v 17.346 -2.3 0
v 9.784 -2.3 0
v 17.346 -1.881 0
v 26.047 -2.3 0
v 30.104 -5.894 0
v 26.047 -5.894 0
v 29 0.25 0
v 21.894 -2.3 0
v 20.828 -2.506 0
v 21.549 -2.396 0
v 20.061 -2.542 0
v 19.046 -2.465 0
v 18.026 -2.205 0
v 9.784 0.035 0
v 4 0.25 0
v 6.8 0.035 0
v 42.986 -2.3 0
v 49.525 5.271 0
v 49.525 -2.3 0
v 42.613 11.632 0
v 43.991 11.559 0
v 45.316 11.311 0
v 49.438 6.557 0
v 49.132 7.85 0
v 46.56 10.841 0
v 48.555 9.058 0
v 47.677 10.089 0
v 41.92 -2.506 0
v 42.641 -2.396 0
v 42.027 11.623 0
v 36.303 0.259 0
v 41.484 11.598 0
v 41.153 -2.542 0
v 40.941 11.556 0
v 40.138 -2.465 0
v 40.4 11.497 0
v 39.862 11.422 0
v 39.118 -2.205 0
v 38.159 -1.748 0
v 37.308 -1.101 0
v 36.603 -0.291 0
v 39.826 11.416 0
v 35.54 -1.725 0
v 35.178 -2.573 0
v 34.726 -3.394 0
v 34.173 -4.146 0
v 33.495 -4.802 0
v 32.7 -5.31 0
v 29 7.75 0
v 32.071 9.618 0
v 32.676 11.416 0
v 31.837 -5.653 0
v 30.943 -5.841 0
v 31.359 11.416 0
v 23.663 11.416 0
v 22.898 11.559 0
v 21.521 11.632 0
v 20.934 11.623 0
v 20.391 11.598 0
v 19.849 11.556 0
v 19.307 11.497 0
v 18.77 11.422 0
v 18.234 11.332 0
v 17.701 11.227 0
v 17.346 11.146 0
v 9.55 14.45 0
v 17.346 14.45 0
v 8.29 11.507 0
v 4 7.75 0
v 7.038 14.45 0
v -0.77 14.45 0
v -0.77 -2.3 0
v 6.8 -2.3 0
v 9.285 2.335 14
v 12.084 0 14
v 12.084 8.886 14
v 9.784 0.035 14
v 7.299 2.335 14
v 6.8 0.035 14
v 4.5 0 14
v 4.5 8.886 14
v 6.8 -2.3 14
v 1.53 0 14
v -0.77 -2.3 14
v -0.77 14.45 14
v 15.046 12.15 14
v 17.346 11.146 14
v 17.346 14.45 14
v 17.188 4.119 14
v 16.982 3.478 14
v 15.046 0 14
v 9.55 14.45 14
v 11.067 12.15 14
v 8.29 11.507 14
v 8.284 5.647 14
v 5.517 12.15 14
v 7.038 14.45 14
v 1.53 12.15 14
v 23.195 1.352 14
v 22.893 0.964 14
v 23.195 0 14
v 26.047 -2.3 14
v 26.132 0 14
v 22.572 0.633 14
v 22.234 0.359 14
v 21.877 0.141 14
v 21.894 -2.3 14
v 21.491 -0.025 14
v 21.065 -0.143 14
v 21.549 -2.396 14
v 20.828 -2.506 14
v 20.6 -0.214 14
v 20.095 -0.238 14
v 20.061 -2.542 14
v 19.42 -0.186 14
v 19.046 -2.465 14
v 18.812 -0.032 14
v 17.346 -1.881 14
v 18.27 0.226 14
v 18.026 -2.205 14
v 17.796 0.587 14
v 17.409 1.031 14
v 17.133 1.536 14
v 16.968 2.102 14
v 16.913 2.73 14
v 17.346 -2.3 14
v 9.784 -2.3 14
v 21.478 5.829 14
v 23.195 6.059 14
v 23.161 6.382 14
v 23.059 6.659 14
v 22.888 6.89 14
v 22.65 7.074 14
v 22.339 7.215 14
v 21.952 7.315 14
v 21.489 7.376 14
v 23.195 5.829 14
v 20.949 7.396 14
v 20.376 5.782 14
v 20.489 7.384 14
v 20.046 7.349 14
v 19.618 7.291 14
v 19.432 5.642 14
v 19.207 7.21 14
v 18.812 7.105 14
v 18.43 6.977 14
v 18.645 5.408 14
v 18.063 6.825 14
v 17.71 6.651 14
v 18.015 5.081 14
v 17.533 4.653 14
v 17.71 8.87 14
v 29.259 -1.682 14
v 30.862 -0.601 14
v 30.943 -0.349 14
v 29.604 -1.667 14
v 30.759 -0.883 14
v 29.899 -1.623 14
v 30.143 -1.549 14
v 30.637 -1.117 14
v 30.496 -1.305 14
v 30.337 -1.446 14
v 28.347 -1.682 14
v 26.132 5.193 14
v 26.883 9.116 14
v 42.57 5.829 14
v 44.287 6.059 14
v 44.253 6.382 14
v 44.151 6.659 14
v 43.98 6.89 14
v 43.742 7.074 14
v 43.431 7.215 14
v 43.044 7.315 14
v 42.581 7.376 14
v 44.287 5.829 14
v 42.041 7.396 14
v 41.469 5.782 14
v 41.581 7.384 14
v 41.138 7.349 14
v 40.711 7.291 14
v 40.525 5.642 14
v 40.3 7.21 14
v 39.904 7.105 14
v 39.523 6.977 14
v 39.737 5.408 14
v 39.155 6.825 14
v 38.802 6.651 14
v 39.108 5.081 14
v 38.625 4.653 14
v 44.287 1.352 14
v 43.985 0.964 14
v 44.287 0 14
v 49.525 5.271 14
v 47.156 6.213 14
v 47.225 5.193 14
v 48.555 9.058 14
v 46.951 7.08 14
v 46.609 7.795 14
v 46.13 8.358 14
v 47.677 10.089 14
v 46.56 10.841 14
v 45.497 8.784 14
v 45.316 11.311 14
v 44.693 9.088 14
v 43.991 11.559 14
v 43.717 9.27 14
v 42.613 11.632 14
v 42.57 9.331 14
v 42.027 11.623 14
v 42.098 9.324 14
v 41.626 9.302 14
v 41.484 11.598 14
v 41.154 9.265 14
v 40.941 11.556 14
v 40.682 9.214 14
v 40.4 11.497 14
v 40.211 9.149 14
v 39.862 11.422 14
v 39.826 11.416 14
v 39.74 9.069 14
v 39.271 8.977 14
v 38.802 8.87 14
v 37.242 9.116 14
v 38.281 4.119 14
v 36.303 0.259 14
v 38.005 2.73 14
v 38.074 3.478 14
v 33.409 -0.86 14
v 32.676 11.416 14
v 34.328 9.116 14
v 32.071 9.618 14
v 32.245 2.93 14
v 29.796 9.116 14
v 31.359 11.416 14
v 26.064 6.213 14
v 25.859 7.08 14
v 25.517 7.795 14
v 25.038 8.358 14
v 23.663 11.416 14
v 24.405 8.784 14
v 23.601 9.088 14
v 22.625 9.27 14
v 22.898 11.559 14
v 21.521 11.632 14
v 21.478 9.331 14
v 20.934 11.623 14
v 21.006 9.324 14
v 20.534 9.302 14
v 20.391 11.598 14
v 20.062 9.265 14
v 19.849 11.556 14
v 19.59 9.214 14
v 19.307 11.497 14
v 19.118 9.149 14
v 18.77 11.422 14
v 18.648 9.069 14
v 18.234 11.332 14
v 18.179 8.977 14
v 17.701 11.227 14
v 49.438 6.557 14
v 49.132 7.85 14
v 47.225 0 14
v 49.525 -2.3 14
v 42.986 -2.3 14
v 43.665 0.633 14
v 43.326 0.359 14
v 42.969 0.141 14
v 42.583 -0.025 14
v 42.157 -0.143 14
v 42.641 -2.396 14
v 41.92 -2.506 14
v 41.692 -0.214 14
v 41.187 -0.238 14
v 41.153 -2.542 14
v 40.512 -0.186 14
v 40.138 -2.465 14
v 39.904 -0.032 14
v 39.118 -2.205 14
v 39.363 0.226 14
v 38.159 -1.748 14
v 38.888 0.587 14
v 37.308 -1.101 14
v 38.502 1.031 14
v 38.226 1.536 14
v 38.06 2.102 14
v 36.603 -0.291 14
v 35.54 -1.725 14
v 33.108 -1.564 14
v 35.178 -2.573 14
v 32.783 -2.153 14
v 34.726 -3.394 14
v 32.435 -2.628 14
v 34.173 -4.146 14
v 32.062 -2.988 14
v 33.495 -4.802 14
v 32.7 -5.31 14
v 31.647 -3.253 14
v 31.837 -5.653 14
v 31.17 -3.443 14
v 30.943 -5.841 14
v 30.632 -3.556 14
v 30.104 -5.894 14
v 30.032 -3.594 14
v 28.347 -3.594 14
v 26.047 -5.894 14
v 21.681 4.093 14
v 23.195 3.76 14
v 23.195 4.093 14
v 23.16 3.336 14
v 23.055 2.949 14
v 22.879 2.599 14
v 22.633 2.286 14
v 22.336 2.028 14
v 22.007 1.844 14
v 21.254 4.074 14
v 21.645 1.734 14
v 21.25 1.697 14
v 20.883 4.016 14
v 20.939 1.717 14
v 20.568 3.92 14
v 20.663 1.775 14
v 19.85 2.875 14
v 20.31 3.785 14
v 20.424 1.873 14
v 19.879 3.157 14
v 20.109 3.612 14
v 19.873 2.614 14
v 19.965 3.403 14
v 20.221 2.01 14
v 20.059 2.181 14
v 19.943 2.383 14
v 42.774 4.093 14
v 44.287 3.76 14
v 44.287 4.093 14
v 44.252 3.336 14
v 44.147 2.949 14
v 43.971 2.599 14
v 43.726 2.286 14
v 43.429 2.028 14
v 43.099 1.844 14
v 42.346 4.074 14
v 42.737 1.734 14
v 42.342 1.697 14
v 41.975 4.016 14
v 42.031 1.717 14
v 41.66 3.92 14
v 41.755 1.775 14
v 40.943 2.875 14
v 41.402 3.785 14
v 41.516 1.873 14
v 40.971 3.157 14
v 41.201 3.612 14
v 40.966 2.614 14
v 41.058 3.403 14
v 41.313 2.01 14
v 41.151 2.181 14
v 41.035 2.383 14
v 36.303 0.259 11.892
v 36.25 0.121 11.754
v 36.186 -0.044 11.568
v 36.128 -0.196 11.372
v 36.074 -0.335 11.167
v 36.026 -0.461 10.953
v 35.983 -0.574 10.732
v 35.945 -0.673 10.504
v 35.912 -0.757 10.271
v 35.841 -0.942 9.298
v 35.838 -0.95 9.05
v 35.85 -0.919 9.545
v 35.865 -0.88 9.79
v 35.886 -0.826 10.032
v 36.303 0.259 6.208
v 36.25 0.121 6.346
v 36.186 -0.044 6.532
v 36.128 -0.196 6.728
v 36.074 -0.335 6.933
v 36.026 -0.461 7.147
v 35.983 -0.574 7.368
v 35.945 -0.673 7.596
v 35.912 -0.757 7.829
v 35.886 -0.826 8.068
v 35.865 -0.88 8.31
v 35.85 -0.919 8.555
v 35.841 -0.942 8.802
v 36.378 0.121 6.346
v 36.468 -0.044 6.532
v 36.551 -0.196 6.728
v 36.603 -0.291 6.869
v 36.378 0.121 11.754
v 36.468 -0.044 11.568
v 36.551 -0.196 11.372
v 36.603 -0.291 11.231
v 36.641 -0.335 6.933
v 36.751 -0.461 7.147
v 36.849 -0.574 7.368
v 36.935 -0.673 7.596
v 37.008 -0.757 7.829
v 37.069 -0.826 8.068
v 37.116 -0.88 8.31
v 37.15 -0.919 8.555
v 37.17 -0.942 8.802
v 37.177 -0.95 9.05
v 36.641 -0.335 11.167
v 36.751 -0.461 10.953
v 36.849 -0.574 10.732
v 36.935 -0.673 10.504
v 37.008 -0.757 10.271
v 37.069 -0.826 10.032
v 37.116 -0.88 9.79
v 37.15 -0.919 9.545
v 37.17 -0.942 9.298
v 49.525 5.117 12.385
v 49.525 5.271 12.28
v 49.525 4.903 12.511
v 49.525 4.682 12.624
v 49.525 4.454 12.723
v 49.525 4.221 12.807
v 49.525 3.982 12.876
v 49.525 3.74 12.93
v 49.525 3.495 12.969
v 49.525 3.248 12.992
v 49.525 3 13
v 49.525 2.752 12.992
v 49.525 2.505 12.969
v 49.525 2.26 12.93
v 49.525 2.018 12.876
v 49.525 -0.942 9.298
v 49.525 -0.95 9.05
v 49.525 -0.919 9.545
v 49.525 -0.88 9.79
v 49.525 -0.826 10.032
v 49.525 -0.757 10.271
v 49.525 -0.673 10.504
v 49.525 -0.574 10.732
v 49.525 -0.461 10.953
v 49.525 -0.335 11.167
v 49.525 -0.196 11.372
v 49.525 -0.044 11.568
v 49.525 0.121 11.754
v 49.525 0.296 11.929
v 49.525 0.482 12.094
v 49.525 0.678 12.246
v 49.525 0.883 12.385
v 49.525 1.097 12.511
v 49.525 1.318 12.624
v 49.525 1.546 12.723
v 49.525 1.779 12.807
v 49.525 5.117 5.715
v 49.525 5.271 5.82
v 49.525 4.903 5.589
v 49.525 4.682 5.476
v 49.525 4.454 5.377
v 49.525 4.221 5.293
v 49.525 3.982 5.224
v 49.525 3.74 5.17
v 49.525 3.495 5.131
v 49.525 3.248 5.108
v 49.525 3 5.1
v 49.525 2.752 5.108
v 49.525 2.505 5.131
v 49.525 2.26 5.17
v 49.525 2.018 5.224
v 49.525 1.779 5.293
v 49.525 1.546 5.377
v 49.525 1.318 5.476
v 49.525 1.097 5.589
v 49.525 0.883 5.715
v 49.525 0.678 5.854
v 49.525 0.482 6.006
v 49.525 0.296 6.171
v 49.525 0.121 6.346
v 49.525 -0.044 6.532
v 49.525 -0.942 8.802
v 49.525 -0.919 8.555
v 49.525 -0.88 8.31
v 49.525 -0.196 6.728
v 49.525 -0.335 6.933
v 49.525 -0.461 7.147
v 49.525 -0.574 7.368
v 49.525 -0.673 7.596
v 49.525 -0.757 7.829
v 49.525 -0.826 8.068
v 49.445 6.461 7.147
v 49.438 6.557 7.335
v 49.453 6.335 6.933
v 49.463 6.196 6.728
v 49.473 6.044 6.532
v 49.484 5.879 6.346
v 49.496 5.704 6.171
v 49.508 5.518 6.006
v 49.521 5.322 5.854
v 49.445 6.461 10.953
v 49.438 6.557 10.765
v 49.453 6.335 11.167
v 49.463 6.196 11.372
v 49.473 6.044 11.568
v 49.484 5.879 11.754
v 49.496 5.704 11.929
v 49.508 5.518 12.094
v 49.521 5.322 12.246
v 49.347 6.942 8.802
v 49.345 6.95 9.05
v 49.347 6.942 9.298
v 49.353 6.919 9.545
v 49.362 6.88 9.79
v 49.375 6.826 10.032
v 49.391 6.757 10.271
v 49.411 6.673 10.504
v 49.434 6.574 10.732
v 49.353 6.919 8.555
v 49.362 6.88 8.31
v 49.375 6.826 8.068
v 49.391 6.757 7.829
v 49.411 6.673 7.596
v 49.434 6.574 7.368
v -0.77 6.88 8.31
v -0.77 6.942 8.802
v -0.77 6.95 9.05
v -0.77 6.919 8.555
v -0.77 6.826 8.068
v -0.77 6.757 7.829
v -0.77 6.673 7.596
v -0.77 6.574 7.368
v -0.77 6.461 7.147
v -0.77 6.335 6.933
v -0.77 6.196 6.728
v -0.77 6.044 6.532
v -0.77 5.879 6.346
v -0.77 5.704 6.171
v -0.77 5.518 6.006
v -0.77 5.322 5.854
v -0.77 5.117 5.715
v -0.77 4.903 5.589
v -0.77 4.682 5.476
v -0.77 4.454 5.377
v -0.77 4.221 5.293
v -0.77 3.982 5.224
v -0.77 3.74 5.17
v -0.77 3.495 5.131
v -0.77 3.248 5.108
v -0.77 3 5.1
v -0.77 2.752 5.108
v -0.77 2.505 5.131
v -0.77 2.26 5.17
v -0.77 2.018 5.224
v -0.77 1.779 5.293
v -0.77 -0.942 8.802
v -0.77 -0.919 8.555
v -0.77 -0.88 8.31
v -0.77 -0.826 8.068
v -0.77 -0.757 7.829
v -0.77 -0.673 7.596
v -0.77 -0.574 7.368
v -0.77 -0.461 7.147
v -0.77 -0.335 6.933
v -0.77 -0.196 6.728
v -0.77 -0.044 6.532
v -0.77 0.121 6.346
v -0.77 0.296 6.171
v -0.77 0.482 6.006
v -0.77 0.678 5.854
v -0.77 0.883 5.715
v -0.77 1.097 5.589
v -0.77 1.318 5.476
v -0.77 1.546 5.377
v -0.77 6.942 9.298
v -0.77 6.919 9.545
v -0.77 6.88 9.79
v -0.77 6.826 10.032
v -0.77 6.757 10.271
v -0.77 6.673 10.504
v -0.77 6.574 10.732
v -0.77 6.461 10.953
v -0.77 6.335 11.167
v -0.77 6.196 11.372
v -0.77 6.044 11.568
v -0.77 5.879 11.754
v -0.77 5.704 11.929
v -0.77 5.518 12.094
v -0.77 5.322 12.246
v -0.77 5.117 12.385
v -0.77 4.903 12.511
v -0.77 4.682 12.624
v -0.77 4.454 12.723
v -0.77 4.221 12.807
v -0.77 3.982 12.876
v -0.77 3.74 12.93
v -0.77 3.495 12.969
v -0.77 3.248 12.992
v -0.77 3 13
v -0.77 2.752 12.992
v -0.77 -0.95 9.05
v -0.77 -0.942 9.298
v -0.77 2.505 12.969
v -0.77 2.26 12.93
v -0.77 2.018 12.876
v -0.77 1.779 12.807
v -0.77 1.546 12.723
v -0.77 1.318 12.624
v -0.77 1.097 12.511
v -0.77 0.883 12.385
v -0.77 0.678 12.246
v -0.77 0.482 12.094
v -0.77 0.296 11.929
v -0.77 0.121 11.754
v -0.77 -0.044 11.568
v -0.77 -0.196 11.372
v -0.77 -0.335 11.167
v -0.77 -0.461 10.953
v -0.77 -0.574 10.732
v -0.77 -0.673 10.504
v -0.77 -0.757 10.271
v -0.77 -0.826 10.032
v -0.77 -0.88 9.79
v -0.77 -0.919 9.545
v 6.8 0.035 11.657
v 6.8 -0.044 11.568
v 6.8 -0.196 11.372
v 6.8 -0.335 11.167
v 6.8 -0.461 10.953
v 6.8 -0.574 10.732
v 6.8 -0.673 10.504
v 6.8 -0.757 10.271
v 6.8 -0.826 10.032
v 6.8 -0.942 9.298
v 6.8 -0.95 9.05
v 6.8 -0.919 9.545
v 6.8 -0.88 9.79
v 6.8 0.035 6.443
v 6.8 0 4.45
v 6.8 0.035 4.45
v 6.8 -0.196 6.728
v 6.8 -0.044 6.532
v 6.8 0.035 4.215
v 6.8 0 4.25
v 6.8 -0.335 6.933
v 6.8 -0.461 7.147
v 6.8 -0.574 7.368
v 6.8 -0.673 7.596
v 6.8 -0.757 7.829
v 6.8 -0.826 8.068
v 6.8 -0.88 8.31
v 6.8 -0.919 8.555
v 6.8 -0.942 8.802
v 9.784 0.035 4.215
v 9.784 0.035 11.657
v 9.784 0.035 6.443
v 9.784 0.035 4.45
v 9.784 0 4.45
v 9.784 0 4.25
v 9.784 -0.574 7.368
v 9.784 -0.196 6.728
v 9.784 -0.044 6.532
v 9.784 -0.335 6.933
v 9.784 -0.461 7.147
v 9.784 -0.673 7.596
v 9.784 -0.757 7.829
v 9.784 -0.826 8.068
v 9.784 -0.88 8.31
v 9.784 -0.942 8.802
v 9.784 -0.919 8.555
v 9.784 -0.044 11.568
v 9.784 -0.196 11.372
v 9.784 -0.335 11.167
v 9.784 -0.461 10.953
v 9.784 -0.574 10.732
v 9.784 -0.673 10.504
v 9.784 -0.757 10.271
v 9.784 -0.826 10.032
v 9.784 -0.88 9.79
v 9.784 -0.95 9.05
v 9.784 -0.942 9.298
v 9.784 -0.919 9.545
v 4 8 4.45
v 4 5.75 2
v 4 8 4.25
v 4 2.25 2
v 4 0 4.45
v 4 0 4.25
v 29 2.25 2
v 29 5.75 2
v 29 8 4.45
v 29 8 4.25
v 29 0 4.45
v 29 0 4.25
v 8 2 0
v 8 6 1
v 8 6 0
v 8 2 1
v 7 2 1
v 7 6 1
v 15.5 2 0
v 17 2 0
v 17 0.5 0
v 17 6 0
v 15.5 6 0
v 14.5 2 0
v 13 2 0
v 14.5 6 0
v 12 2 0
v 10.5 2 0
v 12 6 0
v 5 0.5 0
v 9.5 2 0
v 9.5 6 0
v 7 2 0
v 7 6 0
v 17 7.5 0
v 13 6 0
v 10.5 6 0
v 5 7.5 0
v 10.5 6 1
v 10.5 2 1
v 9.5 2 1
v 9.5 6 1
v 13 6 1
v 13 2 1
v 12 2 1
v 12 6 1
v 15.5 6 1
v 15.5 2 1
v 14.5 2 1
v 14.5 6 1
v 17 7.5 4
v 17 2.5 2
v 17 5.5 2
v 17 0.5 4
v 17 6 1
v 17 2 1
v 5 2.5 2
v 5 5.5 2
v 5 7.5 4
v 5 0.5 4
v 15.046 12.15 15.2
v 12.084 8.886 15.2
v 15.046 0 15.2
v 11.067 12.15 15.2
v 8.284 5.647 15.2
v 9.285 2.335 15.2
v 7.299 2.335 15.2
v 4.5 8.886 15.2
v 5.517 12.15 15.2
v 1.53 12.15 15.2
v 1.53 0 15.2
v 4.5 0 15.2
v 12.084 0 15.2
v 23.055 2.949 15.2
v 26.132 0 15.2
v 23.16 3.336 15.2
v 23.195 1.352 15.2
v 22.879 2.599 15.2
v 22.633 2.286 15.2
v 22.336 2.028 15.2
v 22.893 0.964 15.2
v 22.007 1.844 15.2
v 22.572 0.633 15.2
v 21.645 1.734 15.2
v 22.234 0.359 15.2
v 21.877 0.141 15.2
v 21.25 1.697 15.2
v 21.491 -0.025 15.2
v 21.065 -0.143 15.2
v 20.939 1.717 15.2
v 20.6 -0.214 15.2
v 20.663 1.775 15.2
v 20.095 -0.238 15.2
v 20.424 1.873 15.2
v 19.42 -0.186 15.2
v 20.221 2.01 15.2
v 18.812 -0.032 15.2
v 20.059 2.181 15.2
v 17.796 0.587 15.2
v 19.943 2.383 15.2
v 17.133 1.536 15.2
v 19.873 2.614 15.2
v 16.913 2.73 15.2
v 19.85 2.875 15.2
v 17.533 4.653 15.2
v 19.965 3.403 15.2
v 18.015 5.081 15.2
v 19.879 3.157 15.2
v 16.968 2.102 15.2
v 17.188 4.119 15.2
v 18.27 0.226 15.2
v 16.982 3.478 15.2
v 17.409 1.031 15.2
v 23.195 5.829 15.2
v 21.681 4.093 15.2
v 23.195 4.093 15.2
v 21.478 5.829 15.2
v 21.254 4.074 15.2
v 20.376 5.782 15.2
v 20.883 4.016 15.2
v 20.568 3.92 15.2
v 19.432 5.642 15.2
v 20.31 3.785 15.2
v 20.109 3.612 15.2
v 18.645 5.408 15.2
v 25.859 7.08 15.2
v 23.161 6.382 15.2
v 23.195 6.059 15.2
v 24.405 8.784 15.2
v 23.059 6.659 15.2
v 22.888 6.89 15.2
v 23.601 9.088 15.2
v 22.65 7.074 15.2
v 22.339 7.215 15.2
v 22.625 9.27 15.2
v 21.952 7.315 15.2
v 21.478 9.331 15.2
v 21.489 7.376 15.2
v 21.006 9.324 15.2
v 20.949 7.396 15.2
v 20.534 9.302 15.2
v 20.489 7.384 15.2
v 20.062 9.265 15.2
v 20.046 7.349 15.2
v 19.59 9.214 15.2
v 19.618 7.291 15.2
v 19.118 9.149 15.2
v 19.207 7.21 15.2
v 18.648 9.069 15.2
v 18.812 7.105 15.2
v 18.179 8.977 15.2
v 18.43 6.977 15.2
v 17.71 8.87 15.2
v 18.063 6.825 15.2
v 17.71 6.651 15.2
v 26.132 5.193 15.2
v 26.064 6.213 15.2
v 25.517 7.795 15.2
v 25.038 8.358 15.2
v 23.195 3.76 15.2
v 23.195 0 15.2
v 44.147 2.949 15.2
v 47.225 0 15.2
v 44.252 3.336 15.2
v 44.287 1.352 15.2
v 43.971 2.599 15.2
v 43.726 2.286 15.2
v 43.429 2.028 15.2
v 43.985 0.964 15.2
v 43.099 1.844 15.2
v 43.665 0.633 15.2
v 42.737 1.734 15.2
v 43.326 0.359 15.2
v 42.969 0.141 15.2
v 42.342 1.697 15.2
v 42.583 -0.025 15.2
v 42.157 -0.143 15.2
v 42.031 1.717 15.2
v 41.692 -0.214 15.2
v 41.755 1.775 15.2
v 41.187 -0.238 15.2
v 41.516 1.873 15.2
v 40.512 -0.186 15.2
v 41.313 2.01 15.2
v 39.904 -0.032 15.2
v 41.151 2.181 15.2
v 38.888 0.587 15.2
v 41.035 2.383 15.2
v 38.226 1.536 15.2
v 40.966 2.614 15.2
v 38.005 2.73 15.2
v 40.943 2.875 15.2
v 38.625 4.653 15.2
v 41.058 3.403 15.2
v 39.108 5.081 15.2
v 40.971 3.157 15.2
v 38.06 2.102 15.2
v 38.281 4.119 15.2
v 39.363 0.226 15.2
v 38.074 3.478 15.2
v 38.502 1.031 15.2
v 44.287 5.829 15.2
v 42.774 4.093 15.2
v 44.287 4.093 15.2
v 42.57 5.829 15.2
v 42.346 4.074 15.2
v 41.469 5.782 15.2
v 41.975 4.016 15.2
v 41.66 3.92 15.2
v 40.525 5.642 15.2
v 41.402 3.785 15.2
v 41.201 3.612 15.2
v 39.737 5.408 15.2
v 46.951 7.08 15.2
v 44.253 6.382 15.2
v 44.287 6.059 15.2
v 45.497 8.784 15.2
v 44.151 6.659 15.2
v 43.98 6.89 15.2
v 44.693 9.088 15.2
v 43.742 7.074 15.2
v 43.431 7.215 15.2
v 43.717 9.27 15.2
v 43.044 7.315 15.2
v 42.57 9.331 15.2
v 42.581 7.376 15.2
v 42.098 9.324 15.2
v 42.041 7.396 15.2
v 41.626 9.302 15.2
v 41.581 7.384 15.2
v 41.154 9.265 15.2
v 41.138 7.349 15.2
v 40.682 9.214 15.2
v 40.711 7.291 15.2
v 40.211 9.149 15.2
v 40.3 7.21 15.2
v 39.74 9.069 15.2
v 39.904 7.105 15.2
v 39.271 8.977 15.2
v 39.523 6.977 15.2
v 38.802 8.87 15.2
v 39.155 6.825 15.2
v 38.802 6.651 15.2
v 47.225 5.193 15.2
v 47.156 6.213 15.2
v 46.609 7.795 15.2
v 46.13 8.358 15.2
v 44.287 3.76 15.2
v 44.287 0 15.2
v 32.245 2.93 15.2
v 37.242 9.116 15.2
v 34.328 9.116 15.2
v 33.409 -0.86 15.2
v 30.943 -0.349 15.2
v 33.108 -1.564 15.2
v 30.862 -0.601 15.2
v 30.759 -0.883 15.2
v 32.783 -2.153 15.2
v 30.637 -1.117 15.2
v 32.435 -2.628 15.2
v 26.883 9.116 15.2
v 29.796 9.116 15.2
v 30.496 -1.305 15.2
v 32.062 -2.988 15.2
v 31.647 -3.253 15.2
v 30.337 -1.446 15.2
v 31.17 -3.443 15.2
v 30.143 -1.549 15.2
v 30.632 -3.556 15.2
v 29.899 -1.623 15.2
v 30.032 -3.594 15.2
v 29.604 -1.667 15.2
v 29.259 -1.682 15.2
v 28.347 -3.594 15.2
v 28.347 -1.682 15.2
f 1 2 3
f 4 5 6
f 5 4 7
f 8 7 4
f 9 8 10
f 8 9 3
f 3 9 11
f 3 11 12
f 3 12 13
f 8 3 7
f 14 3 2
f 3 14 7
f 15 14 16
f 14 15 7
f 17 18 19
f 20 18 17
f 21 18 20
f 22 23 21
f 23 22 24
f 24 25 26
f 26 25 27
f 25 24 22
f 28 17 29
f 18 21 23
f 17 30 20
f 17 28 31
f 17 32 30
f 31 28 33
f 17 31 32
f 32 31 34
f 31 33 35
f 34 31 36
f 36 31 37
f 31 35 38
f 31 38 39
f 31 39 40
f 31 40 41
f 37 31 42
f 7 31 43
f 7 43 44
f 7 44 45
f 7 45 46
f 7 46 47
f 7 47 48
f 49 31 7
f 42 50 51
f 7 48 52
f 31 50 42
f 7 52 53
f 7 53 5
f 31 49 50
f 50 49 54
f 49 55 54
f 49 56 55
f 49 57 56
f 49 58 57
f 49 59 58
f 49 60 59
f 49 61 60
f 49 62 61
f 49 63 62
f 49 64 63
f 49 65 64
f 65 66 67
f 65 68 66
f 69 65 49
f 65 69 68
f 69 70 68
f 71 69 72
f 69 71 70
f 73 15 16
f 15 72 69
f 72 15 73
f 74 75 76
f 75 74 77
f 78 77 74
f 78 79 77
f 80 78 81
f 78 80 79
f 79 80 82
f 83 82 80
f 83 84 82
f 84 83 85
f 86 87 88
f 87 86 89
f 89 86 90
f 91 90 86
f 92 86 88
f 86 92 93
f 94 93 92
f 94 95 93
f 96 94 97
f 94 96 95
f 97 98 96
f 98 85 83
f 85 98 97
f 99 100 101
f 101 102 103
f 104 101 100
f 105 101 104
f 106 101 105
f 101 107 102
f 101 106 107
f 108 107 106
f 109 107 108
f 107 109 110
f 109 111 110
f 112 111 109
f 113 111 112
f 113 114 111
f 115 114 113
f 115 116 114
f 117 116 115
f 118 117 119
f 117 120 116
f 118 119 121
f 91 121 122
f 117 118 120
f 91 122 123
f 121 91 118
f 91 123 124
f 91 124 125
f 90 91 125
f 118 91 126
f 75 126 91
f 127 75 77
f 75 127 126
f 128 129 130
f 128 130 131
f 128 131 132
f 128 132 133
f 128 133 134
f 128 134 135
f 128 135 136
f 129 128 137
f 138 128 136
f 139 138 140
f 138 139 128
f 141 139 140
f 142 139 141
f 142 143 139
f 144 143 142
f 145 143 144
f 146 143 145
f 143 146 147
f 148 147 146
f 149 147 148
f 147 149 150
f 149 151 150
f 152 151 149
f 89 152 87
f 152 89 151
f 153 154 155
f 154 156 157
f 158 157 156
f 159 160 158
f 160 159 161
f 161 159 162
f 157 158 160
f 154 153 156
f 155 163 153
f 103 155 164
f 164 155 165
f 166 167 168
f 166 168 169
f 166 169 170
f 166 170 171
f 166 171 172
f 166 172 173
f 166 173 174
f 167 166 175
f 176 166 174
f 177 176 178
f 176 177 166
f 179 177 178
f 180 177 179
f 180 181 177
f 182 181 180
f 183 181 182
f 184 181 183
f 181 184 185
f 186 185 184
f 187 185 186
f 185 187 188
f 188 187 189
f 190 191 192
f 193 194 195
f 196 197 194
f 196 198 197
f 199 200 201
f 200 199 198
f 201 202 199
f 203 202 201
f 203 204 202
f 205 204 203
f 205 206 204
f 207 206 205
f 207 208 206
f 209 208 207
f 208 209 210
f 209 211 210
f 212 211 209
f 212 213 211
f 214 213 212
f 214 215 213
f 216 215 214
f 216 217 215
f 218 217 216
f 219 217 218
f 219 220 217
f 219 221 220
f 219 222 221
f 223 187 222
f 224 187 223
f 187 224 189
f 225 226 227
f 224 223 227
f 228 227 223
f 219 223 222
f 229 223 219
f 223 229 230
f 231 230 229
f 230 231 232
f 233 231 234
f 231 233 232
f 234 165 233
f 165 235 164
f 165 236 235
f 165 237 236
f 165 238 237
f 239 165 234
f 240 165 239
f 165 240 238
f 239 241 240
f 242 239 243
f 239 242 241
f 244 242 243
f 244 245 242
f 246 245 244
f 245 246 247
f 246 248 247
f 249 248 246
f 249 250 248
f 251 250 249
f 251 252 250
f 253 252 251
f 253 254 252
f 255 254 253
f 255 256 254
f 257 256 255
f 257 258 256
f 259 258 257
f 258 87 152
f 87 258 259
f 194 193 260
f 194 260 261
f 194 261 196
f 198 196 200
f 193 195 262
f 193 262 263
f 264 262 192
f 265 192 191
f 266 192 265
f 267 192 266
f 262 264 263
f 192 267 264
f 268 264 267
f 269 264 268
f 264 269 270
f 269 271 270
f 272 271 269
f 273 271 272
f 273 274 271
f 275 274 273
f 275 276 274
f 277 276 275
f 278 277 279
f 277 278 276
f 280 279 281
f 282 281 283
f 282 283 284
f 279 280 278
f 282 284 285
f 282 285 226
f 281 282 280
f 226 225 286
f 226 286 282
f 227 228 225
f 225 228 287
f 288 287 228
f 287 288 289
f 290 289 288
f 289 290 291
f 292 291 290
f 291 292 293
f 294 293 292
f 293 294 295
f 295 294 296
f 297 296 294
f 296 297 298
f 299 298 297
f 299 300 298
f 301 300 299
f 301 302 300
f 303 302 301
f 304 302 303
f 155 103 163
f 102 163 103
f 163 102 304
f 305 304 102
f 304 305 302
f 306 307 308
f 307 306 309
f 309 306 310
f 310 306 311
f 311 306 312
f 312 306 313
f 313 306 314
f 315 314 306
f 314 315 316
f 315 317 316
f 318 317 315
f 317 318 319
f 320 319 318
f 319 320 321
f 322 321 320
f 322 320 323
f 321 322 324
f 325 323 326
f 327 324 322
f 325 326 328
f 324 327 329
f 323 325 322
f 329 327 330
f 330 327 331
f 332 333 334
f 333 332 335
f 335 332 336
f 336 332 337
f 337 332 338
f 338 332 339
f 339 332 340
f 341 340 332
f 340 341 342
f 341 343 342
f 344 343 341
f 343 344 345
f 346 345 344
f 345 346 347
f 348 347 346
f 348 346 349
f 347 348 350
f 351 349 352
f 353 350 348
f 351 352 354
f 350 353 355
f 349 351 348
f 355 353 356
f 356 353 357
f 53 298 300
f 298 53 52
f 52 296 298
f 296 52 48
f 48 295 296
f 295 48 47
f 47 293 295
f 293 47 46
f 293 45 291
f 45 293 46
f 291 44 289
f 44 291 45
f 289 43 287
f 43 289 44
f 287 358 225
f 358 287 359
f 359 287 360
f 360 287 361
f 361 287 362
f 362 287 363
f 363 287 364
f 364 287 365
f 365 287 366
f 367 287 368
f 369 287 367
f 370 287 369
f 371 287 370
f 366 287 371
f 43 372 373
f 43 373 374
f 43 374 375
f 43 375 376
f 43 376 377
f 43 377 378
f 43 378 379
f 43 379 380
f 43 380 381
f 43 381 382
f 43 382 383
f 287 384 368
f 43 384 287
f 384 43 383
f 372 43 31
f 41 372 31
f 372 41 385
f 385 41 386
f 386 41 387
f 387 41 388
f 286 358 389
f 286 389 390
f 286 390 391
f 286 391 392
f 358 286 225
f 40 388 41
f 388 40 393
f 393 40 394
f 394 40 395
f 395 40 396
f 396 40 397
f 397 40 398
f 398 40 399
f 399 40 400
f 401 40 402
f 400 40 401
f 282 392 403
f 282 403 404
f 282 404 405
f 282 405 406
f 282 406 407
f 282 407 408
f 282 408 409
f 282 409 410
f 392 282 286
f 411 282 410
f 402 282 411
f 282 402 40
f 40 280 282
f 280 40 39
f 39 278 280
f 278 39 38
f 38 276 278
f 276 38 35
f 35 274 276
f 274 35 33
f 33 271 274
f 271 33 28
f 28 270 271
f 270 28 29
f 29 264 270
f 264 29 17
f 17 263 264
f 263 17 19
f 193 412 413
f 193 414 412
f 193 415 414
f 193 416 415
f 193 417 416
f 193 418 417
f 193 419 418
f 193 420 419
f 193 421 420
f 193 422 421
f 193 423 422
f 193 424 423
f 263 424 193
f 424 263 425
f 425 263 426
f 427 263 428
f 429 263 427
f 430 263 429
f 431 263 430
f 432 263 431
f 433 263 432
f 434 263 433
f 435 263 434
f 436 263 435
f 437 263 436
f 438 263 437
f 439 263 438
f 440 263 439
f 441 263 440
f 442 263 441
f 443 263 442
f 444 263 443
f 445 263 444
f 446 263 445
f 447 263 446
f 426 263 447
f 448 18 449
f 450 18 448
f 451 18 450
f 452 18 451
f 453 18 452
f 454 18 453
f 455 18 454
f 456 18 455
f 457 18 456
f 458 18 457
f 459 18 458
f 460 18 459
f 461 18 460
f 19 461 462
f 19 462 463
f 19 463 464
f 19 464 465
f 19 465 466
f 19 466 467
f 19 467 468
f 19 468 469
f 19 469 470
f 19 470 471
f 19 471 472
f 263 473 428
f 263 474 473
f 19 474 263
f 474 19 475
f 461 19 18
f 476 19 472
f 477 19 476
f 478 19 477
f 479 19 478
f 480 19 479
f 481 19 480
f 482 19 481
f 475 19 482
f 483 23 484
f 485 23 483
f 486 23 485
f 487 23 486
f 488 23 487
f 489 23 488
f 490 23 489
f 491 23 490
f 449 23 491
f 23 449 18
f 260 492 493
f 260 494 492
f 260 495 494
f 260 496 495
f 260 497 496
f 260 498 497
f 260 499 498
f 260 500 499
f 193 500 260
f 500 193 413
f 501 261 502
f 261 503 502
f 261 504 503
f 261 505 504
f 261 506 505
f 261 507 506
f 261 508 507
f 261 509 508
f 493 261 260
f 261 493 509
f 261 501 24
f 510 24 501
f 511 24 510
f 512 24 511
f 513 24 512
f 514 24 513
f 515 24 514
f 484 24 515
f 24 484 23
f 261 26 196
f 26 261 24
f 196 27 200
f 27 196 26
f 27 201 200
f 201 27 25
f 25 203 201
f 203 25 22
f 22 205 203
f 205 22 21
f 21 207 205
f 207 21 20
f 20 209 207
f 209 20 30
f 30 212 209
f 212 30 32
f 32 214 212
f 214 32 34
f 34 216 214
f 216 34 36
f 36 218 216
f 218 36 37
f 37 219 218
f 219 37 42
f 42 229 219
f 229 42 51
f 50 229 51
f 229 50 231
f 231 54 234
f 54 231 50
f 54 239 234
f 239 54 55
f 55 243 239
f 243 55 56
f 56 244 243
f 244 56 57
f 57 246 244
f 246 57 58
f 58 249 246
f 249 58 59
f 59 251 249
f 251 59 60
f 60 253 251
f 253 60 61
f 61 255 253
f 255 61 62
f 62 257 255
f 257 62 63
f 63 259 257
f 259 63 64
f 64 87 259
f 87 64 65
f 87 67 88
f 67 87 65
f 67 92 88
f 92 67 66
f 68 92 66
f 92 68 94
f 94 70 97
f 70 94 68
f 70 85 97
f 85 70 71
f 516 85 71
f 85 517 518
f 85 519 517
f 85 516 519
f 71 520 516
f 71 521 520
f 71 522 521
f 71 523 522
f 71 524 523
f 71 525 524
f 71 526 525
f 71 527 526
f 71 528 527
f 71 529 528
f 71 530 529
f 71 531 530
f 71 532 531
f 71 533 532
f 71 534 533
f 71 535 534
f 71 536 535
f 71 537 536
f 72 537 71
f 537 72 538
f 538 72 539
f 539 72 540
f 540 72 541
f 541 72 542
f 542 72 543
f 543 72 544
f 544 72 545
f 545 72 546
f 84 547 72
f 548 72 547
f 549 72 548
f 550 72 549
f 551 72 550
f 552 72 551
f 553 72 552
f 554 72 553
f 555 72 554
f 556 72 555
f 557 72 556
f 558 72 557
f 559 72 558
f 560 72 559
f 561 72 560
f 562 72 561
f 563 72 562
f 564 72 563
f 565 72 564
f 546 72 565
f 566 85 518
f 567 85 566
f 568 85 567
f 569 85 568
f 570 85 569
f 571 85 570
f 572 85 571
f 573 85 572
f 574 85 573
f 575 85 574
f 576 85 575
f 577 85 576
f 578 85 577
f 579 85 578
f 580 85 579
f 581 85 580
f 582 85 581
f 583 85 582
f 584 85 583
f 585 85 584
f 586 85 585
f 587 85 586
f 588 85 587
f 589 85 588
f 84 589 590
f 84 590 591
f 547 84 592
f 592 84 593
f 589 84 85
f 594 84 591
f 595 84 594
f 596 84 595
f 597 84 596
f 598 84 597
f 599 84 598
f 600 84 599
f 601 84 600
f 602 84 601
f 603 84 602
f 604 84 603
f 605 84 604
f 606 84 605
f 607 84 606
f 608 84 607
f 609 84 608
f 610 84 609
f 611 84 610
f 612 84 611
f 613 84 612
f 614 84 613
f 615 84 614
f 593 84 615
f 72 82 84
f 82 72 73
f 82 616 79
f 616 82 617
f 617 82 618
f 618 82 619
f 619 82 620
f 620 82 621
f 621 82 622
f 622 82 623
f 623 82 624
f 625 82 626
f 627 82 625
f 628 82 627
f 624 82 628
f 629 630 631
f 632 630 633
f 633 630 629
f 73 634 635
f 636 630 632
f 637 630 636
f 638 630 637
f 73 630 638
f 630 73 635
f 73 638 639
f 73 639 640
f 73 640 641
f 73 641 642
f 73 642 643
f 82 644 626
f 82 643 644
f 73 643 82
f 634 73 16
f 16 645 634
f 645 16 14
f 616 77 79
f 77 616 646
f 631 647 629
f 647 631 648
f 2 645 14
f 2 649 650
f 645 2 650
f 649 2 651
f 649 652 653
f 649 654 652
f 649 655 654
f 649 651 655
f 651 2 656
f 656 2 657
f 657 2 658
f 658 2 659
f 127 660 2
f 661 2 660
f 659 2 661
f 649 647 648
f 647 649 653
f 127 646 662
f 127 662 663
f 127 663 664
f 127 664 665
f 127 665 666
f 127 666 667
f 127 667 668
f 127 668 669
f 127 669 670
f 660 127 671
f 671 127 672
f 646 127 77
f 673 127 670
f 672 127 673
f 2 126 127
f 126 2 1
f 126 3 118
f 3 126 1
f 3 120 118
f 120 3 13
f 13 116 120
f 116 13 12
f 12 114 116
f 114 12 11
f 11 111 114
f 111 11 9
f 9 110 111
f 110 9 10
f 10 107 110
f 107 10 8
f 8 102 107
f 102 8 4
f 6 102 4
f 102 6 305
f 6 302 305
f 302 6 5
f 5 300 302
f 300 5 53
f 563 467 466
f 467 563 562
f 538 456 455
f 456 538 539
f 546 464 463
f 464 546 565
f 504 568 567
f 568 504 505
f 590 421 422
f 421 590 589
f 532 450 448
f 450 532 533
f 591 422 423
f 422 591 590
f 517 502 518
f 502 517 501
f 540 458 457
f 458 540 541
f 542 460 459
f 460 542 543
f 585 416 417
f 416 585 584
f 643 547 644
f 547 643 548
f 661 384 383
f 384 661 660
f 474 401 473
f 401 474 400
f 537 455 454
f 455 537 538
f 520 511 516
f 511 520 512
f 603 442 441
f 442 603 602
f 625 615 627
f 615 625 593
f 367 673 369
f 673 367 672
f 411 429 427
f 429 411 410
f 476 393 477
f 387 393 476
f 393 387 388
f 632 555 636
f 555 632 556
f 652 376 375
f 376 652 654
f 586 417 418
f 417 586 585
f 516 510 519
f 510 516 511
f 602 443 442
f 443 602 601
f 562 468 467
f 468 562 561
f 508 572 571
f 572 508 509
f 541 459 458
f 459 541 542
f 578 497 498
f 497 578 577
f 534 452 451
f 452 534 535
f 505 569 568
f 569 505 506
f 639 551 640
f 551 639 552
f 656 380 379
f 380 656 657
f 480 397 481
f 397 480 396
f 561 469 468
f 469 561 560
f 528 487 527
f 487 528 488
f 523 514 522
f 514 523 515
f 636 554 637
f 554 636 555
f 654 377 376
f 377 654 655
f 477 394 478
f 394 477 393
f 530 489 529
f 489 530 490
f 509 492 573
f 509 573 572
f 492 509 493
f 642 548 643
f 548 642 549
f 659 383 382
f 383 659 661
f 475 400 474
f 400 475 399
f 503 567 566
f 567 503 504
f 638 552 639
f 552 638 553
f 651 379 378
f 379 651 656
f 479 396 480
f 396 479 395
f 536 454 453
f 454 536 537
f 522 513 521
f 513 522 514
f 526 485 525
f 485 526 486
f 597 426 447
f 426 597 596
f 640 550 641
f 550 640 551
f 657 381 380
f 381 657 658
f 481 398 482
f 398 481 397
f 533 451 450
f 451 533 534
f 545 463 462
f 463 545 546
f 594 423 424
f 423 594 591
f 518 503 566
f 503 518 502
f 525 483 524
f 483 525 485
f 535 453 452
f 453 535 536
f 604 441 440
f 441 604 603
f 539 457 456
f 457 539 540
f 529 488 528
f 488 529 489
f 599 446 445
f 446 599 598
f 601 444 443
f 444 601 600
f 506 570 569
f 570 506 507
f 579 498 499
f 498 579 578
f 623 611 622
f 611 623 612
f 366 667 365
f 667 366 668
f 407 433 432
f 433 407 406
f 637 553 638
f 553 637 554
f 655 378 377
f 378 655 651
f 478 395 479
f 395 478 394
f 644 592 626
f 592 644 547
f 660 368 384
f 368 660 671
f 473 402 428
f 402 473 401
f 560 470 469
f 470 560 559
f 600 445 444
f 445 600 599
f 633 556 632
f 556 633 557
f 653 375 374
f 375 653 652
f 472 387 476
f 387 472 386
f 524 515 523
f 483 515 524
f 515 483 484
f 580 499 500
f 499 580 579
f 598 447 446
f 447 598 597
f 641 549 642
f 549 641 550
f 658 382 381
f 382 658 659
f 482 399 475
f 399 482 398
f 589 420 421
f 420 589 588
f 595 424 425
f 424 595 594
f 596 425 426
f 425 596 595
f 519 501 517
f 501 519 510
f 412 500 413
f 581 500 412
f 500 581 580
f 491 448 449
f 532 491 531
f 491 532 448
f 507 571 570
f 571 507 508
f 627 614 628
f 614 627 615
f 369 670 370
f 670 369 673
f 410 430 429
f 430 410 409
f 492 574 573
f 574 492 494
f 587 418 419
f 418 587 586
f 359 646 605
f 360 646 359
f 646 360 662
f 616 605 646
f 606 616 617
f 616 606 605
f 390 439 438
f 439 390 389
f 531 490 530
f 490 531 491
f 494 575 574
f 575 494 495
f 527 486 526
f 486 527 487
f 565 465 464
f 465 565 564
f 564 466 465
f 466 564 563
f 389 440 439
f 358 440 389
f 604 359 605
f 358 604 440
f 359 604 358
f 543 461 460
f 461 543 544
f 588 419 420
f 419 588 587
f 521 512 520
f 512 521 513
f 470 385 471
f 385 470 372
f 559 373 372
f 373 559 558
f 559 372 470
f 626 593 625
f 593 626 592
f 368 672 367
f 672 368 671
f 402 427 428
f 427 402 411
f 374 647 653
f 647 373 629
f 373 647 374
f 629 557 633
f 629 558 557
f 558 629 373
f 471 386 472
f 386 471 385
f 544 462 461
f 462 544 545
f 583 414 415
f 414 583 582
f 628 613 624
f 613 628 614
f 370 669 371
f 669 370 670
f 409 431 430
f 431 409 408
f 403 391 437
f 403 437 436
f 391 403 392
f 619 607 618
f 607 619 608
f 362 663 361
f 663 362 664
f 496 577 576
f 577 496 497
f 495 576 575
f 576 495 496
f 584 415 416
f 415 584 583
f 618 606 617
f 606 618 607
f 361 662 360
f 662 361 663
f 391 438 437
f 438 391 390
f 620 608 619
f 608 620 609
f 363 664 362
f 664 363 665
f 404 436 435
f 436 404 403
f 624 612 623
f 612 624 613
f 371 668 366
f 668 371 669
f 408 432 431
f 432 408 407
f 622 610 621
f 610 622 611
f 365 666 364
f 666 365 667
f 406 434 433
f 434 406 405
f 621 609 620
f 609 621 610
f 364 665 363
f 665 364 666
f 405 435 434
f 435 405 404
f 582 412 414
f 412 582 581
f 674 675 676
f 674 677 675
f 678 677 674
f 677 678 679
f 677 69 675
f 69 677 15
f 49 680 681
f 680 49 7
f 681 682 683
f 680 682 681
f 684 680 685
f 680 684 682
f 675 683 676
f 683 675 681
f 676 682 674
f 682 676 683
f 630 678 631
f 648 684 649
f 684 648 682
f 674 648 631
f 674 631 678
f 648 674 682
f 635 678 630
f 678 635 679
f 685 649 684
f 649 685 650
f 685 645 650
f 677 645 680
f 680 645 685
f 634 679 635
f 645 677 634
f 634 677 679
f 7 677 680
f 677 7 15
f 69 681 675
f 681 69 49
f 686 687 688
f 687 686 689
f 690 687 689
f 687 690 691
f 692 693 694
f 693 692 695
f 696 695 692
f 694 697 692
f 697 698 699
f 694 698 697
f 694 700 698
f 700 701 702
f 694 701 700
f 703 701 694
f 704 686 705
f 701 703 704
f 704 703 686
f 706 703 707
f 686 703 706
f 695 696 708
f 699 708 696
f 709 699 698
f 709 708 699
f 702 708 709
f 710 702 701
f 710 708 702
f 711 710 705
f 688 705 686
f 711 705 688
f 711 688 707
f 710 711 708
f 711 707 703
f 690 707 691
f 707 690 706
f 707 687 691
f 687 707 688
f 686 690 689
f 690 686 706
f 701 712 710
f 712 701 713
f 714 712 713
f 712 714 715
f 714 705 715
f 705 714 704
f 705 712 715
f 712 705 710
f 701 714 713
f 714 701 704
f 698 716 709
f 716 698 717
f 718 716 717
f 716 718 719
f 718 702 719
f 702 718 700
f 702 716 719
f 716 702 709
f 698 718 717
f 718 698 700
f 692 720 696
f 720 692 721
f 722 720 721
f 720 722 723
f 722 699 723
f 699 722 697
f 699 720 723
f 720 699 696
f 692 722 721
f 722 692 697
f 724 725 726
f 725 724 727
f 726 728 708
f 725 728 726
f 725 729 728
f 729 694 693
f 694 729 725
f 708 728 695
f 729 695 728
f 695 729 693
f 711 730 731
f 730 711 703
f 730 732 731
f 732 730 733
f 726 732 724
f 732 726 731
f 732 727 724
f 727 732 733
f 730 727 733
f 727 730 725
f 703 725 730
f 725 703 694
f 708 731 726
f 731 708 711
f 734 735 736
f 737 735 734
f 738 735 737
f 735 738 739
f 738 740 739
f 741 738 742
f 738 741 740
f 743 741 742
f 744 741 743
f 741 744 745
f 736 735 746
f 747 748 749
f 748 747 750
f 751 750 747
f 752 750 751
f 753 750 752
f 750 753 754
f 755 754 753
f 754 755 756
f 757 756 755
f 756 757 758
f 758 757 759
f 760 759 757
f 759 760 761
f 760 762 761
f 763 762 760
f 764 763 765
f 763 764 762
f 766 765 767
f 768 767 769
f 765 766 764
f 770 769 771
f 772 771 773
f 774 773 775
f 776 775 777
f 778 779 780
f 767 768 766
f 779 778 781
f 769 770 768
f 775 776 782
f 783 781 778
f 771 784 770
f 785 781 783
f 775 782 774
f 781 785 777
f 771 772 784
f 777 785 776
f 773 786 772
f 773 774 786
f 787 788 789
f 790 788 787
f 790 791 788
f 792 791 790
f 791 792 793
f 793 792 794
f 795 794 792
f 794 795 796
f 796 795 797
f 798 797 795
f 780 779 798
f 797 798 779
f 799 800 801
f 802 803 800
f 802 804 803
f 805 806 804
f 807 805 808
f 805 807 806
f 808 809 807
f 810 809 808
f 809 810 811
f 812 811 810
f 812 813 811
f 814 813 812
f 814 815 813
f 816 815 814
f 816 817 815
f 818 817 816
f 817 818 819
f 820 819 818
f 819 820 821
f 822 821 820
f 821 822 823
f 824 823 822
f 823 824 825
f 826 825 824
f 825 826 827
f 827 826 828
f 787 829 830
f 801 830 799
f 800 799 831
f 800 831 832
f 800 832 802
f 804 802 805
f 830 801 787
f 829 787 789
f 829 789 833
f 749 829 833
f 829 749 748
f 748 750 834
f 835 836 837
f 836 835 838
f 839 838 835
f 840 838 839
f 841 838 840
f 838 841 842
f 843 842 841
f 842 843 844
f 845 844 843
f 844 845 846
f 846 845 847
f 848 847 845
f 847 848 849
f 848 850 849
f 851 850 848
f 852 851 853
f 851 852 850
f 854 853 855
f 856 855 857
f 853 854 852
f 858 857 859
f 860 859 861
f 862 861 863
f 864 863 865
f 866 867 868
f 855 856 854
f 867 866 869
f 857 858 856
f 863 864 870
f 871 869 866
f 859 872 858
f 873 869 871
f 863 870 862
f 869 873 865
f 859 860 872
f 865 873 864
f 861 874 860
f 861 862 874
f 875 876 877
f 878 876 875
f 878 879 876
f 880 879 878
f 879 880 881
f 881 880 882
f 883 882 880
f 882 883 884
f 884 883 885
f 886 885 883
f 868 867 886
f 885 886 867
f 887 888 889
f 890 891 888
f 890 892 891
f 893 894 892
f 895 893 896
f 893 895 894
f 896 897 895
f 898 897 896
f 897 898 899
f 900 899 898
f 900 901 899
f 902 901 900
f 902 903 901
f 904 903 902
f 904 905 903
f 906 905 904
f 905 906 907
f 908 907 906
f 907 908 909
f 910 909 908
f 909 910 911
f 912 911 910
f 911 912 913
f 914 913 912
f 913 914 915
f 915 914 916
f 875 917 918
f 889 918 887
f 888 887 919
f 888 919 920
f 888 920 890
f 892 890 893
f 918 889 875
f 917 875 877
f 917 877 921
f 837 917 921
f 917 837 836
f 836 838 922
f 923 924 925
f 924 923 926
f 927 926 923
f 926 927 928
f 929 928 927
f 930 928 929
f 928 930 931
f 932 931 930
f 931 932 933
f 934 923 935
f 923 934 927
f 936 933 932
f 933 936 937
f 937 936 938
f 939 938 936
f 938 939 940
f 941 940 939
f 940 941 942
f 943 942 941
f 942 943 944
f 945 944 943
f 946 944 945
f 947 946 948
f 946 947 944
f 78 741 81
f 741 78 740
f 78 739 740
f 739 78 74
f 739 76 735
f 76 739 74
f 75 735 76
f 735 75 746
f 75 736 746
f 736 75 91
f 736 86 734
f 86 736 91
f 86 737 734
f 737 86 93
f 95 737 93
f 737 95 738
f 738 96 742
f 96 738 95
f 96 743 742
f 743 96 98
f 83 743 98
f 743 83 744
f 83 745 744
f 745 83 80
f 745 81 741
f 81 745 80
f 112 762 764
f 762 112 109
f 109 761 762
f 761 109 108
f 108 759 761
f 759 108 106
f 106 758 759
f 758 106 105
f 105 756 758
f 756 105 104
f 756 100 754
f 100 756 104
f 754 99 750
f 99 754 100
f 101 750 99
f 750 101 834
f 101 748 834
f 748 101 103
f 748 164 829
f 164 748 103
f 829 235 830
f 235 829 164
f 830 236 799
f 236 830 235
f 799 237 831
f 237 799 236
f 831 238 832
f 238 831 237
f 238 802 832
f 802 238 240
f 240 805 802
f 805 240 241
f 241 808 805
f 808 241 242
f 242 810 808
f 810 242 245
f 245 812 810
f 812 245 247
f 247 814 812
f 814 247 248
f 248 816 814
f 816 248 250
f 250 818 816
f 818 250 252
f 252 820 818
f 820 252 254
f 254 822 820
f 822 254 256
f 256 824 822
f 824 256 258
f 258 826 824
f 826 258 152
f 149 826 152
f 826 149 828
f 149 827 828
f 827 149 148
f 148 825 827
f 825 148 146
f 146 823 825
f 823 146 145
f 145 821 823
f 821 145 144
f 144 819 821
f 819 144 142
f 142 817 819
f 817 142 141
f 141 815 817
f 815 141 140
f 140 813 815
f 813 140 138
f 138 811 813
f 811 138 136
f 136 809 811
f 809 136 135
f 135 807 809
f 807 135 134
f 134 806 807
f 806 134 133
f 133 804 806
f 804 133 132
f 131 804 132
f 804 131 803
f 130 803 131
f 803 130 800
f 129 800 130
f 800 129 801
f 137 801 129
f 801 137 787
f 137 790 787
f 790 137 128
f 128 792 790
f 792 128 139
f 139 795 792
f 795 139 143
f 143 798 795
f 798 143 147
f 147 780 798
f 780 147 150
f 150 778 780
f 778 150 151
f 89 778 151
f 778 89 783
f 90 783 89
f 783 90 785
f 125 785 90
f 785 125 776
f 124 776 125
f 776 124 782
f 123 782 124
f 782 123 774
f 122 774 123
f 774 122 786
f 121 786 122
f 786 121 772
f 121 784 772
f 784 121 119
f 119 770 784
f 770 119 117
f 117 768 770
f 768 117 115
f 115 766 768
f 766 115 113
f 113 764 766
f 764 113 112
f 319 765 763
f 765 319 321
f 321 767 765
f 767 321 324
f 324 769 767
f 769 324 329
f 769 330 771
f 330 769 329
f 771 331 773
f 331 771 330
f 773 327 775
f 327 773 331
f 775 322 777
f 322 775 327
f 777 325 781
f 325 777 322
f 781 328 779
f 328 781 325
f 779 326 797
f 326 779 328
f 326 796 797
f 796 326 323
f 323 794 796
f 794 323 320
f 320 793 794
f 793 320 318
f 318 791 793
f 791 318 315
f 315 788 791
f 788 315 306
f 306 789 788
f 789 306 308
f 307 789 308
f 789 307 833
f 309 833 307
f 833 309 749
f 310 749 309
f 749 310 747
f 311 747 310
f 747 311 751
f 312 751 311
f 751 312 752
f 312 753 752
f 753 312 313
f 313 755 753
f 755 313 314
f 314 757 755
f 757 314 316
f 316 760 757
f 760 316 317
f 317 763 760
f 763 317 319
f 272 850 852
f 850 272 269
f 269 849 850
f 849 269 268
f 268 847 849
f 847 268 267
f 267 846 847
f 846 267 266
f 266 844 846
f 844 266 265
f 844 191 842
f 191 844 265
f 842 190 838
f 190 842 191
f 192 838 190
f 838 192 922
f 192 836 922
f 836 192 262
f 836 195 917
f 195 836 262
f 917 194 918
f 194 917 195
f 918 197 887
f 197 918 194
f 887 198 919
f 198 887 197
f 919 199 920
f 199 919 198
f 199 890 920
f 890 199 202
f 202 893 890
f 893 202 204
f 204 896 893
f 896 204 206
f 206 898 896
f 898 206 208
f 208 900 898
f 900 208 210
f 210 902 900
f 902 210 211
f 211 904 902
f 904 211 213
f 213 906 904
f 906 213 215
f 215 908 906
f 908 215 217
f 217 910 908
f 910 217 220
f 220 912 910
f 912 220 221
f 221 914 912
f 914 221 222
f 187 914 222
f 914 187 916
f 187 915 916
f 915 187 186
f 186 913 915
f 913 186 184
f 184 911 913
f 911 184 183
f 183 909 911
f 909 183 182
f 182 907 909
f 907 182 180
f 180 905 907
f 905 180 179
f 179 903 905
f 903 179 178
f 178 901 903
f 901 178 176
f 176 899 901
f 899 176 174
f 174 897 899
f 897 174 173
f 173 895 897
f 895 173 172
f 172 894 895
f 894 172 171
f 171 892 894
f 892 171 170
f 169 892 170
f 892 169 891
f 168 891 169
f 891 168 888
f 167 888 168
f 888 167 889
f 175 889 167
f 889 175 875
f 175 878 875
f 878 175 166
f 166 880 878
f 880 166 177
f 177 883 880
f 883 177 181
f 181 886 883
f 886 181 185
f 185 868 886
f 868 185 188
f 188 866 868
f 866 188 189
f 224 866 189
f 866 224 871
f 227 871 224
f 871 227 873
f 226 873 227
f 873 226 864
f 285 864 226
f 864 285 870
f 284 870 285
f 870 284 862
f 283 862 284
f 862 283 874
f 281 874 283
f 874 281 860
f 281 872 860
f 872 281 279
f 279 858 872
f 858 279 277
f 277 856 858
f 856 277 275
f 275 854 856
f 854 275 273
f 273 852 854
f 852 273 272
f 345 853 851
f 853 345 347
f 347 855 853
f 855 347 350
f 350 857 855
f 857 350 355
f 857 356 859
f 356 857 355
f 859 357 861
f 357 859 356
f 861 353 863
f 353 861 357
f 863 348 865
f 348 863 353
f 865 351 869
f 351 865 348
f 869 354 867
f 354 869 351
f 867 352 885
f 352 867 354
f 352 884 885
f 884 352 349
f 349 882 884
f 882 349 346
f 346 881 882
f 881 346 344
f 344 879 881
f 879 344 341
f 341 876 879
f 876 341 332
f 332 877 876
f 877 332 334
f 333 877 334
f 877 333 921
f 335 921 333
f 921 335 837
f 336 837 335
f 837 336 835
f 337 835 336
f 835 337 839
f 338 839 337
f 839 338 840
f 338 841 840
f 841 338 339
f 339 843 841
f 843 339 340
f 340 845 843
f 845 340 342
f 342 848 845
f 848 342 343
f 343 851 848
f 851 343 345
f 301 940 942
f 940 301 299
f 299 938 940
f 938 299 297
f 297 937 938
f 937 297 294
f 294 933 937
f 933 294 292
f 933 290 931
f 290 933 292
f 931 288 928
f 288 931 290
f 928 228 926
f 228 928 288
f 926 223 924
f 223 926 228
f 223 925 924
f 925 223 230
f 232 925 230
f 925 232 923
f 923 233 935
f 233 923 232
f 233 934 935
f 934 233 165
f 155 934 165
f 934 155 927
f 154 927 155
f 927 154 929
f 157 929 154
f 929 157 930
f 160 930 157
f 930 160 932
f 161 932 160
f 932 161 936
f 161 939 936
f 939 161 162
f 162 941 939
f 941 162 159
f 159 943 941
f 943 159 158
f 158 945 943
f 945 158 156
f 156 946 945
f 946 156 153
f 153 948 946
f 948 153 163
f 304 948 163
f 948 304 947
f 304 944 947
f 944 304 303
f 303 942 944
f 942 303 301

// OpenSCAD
/*[Name Settings]*/
text_string    = "Maya";
font_name      = "Comic Neue:style=Bold";  // font
letter_height  = 12;      // mm
letter_depth   = 1.2;     // mm (height of raised letters above the base)
outline_margin = 2.3;     // mm (halo around letters)
base_height = 14;         // mm

/*[Hole Settings]*/
hole_diameter  = 7.9;     // mm 
hole_length    = 120;     // mm (long enough to cut fully L↔R)
hole_horizontal  = 3;      // mm 
hole_vertical = 1;
hole_depth_pos = base_height-hole_diameter/2-hole_vertical;     // mm (center under body of letters)

/*[Color]*/
base_color    = "#D11C7D"; // color
letters_color = "#FFFFFF"; // color

/*[Direction/Aligment]*/
rtl = false;

/*[Slider]*/
rail_length = 25;
rail_front_offset = 5;
rail_side_offset = 0.5;
rail_tollerance = 0.25;

slider_length = 12;
slider_width = 7;
slider_cuts = 4;
slider_cut_depth = 1;
slider_cut_width = 1;
slider_cut_margin = 1.5;

// Make sure the user supplied some text
assert(str(text_string) != "", "Error: text_string must not be empty");

// Decide horizontal alignment for text()
text_halign = rtl ? "right" : "left";

module base_with_tunnel() {
    difference() {
        // 1) Extrude the “halo” around text from Z = 0 → base_height
        linear_extrude(height = base_height)
            offset(delta = outline_margin)
                text(
                    text_string,
                    size   = letter_height,
                    font   = font_name,
                    halign = text_halign,
                    valign = "baseline"
                );

        // 2) Subtract a horizontal cylinder (axis = X)
        translate([0, hole_horizontal, hole_depth_pos])
            rotate([0, 90, 0])
                cylinder(
                    d      = hole_diameter,
                    h      = hole_length,
                    center = true,
                    $fn    = 100
                );
    }
}

module raised_letters() {
    translate([0, 0, base_height])
        linear_extrude(height = letter_depth)
            text(
                text_string,
                size   = letter_height,
                font   = font_name,
                halign = text_halign,
                valign = "baseline"
            );
}

module slider_hole() {
  translate([rail_front_offset-1,rail_side_offset,0])
    rotate([90,0,90])  
      linear_extrude(rail_length)
        polygon([
                [0-rail_tollerance*2,0-rail_tollerance],
                [2-rail_tollerance,2],
    [0-rail_tollerance*2,4+rail_tollerance],
    [0-rail_tollerance*2,4+rail_tollerance+0.2],
    [slider_width+2*rail_tollerance,4+rail_tollerance+0.2],
    [slider_width+2*rail_tollerance,4+rail_tollerance],
    [slider_width-2+rail_tollerance,2],
    [slider_width+rail_tollerance*2,0-rail_tollerance]
                ]);
}

module slider() {
  translate([rail_front_offset,rail_side_offset,0])
    rotate([90,0,90])  
      linear_extrude(slider_length)
        polygon([
    [0,0],
    [2,2],
    [0,4],
    [slider_width,4],
    [slider_width-2,2],
    [slider_width,0]
    ]);
}

module slider_cuts() {
    dx = (slider_length - 2)/slider_cuts;
    for (i = [0:slider_cuts]) {
      translate([2+rail_front_offset+i*dx,slider_cut_margin+rail_side_offset,0])
        cube([slider_cut_width,slider_width-2*slider_cut_margin,slider_cut_depth],false);
    }
} 

module name_topper() {
    // Draw the colored base + tunnel
    color(base_color)
    difference() {
      base_with_tunnel();  
      slider_hole();
    }
    
    difference() {  
      slider();
      slider_cuts();
    }
    // Draw the raised letters on top
    color(letters_color)
    raised_letters();

}

name_topper();
